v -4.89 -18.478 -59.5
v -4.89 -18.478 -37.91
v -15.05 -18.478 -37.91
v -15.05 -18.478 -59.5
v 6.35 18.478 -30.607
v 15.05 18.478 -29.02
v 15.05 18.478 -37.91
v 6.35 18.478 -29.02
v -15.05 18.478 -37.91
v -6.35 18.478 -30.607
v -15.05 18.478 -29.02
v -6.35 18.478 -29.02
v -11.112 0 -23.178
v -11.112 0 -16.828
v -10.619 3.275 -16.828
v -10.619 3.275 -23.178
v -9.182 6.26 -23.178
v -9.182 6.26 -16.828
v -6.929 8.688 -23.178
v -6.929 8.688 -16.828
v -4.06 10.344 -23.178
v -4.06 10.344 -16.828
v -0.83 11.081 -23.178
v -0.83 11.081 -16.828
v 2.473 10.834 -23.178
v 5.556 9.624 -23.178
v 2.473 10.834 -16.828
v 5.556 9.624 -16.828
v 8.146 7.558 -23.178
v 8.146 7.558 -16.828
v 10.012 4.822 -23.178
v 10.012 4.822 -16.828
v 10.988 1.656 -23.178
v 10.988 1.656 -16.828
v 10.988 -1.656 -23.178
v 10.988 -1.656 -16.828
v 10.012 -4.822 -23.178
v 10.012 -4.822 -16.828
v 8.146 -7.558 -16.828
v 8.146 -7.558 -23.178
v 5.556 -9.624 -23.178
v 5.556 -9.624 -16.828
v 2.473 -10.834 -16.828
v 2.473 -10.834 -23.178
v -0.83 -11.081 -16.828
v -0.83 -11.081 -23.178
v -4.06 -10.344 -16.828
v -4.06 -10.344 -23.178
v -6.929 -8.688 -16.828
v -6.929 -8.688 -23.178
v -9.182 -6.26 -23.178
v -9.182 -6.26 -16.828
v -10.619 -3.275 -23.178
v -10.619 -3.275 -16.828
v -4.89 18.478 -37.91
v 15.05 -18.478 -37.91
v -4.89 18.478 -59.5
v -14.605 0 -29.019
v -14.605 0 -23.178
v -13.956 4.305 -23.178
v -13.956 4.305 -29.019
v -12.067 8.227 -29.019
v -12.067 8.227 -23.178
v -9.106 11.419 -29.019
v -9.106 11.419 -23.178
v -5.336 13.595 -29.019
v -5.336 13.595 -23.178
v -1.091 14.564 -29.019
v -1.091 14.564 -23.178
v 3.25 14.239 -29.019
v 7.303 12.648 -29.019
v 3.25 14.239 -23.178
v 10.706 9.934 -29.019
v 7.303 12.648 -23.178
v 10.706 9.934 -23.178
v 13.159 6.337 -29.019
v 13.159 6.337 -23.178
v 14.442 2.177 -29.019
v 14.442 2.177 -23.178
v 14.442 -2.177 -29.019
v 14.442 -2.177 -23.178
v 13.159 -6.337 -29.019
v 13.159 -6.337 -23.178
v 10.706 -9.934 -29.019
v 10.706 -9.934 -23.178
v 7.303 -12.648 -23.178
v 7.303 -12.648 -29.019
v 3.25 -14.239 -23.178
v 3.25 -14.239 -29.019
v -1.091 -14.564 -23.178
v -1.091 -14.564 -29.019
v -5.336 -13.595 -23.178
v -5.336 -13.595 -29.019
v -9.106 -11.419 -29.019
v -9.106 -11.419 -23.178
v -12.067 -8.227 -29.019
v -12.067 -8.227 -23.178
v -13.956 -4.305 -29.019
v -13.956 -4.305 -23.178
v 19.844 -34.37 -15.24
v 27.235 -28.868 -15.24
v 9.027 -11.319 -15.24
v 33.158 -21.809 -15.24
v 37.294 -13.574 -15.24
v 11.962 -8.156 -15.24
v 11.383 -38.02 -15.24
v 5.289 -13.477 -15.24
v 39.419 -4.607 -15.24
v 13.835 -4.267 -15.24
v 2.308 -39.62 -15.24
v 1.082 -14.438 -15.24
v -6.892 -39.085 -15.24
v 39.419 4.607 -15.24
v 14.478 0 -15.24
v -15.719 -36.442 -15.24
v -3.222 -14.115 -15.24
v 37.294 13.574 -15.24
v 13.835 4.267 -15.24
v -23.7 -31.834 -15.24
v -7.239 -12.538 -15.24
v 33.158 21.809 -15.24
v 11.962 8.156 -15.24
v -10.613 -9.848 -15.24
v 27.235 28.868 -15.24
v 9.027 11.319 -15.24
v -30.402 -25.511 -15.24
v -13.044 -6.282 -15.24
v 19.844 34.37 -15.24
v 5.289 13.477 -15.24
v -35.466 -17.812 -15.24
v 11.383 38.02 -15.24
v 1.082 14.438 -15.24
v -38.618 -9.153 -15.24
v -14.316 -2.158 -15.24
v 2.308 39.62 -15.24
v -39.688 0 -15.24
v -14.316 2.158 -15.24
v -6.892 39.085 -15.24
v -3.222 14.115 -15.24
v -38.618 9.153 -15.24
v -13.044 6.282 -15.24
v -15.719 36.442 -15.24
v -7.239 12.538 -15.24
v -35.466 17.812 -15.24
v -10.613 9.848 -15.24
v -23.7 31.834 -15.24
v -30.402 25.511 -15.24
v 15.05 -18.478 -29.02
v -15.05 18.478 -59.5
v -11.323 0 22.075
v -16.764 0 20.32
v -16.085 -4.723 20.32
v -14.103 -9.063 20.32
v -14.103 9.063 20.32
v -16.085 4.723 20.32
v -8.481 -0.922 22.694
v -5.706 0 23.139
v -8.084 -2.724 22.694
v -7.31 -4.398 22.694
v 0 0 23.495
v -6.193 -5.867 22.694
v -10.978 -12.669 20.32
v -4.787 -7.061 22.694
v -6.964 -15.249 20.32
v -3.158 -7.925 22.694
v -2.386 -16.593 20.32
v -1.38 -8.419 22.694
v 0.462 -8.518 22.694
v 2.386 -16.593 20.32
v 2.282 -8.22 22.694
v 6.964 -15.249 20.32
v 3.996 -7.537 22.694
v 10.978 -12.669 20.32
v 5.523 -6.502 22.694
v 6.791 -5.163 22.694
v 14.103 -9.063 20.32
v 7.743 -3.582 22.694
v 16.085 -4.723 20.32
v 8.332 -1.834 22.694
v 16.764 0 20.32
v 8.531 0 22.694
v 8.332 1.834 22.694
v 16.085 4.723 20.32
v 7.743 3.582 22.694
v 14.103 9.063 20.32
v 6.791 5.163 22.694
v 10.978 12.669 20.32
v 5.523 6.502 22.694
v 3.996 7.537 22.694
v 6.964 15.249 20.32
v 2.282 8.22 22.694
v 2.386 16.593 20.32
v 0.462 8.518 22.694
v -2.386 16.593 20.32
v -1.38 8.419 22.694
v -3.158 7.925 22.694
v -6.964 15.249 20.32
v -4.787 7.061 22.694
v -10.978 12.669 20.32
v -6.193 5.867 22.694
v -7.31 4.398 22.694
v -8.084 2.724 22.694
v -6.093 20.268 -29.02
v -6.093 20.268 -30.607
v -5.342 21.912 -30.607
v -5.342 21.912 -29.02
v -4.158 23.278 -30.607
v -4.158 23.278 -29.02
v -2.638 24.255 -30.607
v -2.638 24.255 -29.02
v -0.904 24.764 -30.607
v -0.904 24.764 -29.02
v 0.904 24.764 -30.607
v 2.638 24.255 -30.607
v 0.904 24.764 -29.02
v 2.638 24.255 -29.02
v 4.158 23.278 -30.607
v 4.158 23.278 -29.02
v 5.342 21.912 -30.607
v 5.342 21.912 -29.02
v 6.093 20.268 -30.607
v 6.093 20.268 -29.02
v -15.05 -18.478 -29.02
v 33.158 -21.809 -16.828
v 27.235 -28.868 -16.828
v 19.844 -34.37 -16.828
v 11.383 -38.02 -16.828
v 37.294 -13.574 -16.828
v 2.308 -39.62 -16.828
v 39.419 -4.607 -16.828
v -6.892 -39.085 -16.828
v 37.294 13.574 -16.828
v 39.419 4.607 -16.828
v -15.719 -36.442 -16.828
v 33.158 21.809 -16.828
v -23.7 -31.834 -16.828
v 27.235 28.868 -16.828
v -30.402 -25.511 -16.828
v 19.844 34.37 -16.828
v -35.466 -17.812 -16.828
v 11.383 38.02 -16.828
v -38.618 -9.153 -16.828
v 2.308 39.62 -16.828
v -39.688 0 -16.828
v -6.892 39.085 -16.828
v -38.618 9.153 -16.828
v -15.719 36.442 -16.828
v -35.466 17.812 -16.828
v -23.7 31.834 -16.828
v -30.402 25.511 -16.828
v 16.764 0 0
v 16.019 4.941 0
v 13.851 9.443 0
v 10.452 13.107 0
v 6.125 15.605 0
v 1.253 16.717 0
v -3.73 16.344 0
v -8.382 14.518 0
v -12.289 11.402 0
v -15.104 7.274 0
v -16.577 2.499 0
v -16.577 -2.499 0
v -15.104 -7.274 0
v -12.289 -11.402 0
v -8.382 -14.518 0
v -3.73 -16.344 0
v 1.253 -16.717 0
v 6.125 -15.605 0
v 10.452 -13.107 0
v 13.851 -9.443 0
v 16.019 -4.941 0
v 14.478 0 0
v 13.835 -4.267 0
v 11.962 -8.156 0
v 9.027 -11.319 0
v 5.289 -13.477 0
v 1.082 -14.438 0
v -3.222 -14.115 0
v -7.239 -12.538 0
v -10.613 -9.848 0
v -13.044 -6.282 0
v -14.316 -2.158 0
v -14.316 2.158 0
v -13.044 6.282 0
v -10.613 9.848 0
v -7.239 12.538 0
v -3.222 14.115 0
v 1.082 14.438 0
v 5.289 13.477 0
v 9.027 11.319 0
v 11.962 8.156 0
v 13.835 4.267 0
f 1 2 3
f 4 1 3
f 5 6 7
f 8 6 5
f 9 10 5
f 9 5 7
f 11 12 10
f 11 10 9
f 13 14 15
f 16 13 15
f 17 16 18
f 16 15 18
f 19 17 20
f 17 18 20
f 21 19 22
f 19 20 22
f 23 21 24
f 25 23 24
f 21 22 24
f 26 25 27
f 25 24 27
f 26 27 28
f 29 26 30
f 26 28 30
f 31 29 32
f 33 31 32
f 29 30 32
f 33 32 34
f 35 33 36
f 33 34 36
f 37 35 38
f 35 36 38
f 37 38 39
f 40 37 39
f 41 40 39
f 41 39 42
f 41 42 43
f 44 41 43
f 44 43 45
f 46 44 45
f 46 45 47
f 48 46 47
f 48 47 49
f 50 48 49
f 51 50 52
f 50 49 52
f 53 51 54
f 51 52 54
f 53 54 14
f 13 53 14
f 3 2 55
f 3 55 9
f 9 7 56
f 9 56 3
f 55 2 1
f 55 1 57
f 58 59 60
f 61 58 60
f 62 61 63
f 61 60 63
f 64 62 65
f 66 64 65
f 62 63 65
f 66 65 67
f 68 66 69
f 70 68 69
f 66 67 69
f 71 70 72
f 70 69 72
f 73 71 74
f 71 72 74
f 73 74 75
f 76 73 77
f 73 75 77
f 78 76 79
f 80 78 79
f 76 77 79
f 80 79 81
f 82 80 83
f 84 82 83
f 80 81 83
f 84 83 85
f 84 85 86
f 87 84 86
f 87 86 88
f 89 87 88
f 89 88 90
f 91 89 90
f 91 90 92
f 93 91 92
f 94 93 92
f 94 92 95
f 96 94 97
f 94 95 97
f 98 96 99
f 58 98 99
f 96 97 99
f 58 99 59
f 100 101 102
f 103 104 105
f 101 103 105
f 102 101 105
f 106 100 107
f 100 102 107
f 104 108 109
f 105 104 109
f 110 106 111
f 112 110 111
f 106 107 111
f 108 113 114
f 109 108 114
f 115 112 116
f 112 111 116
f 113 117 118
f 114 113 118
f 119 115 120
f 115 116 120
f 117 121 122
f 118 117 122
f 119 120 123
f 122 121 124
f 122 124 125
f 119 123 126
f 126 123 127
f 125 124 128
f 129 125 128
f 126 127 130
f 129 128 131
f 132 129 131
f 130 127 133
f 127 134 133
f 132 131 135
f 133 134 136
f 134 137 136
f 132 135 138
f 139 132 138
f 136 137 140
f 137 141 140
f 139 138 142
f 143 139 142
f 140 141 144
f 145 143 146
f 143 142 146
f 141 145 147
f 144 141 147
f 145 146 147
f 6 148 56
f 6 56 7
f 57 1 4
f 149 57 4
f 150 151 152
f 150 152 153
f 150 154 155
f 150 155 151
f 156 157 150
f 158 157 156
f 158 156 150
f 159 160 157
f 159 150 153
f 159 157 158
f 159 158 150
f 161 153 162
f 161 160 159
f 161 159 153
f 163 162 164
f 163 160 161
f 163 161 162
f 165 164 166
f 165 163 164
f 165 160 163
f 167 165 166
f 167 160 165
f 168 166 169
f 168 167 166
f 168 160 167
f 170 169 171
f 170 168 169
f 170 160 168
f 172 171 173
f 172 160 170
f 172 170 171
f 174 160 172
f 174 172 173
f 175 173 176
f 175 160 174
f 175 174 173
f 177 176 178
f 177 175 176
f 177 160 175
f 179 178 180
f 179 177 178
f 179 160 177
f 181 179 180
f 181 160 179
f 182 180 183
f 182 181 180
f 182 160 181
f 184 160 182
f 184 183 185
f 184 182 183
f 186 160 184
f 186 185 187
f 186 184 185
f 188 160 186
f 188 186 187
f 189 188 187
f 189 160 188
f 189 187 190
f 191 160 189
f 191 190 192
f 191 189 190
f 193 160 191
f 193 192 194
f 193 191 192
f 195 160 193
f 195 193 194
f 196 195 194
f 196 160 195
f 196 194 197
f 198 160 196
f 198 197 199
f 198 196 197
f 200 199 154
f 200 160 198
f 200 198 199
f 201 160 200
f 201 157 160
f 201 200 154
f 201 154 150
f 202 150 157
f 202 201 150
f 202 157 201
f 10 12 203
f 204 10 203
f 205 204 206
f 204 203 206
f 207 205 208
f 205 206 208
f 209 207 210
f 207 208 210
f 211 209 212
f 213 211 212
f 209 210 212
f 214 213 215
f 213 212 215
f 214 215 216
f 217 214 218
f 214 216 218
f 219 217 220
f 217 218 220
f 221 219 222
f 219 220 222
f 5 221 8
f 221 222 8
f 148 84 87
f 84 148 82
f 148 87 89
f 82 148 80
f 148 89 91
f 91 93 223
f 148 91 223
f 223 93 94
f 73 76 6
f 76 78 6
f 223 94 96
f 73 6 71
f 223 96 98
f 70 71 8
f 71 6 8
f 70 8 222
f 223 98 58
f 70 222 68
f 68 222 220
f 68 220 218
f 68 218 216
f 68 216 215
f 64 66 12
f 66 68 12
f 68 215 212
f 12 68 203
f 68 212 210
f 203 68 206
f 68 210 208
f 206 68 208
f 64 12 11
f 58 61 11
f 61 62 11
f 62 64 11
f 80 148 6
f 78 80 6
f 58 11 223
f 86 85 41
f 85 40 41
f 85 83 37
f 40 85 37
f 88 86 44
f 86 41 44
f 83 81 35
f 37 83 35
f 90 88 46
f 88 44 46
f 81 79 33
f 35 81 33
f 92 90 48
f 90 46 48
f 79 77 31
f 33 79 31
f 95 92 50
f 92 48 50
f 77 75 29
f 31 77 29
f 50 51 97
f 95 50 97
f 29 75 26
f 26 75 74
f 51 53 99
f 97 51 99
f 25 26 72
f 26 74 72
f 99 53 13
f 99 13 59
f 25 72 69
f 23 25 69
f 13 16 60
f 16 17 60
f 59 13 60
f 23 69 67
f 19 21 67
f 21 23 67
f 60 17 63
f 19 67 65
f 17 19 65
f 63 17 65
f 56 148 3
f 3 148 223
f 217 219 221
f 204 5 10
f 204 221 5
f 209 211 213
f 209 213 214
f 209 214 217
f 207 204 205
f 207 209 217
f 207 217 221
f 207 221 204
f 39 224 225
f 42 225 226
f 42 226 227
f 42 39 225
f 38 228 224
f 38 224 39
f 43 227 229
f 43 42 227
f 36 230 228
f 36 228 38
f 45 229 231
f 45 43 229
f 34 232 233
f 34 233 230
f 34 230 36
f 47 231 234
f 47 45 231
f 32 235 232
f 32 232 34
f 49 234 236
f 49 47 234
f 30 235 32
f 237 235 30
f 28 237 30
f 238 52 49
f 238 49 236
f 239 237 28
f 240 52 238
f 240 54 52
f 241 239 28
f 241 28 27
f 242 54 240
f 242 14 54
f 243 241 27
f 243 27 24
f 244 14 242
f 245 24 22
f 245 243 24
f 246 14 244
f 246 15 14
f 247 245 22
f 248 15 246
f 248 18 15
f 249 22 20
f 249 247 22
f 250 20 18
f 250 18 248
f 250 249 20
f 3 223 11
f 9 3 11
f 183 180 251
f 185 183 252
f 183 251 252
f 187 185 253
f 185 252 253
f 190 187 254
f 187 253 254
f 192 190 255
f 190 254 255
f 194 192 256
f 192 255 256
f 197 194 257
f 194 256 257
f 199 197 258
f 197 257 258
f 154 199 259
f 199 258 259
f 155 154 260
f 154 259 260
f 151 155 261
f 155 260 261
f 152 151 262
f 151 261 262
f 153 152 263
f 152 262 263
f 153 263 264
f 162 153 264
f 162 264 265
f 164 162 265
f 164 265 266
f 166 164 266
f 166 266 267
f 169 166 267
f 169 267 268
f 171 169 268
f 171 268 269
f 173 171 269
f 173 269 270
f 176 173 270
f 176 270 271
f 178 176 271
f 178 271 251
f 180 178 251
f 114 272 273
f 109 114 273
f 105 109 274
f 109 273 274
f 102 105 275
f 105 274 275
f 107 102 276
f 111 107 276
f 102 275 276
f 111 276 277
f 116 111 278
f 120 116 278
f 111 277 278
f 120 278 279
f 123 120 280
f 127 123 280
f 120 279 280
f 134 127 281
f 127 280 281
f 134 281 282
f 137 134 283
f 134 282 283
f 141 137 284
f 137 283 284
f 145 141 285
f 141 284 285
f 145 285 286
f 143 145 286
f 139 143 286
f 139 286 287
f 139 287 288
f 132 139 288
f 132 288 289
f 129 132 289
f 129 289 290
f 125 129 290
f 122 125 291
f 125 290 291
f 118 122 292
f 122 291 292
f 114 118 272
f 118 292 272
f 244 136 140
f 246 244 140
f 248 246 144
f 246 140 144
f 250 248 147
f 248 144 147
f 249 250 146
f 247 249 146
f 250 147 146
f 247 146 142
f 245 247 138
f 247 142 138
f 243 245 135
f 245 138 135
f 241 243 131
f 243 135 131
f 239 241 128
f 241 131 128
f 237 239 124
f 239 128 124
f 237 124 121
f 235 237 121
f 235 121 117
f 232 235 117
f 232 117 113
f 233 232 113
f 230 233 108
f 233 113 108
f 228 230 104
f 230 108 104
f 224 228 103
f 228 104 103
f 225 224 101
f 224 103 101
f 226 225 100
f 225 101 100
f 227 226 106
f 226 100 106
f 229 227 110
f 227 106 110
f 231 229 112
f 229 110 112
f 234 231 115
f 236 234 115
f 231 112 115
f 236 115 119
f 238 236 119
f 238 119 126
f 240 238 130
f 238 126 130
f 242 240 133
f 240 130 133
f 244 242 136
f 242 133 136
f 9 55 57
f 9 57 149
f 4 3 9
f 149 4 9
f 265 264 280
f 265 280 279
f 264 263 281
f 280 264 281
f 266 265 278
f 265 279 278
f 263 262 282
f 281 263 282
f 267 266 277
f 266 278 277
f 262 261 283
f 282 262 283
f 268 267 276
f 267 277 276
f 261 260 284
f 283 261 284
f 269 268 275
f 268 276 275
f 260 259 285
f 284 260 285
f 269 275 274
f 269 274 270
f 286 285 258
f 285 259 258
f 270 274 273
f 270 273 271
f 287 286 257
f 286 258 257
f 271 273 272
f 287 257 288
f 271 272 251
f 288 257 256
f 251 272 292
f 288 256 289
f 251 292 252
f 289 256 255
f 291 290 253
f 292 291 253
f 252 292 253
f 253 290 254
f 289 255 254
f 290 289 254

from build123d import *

# Parameters (mm, degrees)
SKETCH1_R           = 16.764
BOSS_EXTRUDE1_DEPTH = 20.32
SKETCH3_R           = 14.478
BOSS_EXTRUDE2_DEPTH = 15.24
SKETCH5_R           = 39.6875
BOSS_EXTRUDE4_DEPTH = 1.5875
SKETCH6_R           = 11.1125
BOSS_EXTRUDE5_DEPTH = 6.35
SKETCH7_R           = 14.605
BOSS_EXTRUDE6_DEPTH = 5.842
SKETCH8_W           = 30.099
SKETCH8_H           = 36.957
BOSS_EXTRUDE7_DEPTH = 8.89
BOSS_EXTRUDE8_DEPTH = 1.5875
SKETCH10_W          = 10.16
SKETCH10_H          = 36.957
BOSS_EXTRUDE9_DEPTH = 21.59


with BuildPart() as part:
    # Sketch1 → Boss-Extrude1 (new body)
    with BuildSketch(Plane.XY):
        Circle(SKETCH1_R)
    extrude(amount=BOSS_EXTRUDE1_DEPTH)

    # Sketch2 → Revolve1 (revolve)
    with BuildSketch(Plane(origin=(0, 0, 0), x_dir=(1, 0, 0), z_dir=(0, 1, 0)), mode=Mode.PRIVATE) as revolve1_sk:
        with BuildLine():
            Line((0, -20.32), (16.764, -20.32))
            ThreePointArc((16.764, -20.32), (8.531006989, -22.694256903), (0, -23.495))
            Line((0, -23.495), (0, -20.32))
        make_face()
    revolve(revolve1_sk.sketch.rotate(Axis((0, 0, 17.056334056), (0, 0, 1)), 180), axis=Axis((0, 0, 17.056334056), (0, 0, 1)))

    # Sketch3 → Boss-Extrude2 (add)
    with BuildSketch(Plane(origin=(0, 0, 0), x_dir=(-1, 0, 0), z_dir=(0, 0, -1))):
        with Locations(Location((0, 0, 0), (0, 0, 180))):
            Circle(SKETCH3_R)
    extrude(amount=BOSS_EXTRUDE2_DEPTH)

    # Sketch5 → Boss-Extrude4 (add)
    with BuildSketch(Plane(origin=(0, 0, -15.24), x_dir=(-1, 0, 0), z_dir=(0, 0, -1))):
        Circle(SKETCH5_R)
    extrude(amount=BOSS_EXTRUDE4_DEPTH)

    # Sketch6 → Boss-Extrude5 (add)
    with BuildSketch(Plane(origin=(0, 0, -16.8275), x_dir=(-1, 0, 0), z_dir=(0, 0, -1))):
        Circle(SKETCH6_R)
    extrude(amount=BOSS_EXTRUDE5_DEPTH)

    # Sketch7 → Boss-Extrude6 (add)
    with BuildSketch(Plane(origin=(0, 0, -23.1775), x_dir=(-1, 0, 0), z_dir=(0, 0, -1))):
        Circle(SKETCH7_R)
    extrude(amount=BOSS_EXTRUDE6_DEPTH)

    # Sketch8 → Boss-Extrude7 (add)
    with BuildSketch(Plane(origin=(0, 0, -29.0195), x_dir=(-1, 0, 0), z_dir=(0, 0, -1))):
        Rectangle(SKETCH8_W, SKETCH8_H)
    extrude(amount=BOSS_EXTRUDE7_DEPTH)

    # Sketch9 → Boss-Extrude8 (add)
    with BuildSketch(Plane.XY.offset(-29.0195)):
        with BuildLine():
            Line((6.35, 18.4785), (-6.35, 18.4785))
            ThreePointArc((-6.35, 18.4785), (0, 24.8285), (6.35, 18.4785))
        make_face()
    extrude(amount=-BOSS_EXTRUDE8_DEPTH)


with BuildPart() as body_2:
    # Sketch10 → Boss-Extrude9 (new body)
    with BuildSketch(Plane(origin=(0, 0, -37.9095), x_dir=(-1, 0, 0), z_dir=(0, 0, -1))):
        with Locations((9.9695, 0)):
            Rectangle(SKETCH10_W, SKETCH10_H)
    extrude(amount=BOSS_EXTRUDE9_DEPTH)


solid = Compound([part.part, body_2.part])
